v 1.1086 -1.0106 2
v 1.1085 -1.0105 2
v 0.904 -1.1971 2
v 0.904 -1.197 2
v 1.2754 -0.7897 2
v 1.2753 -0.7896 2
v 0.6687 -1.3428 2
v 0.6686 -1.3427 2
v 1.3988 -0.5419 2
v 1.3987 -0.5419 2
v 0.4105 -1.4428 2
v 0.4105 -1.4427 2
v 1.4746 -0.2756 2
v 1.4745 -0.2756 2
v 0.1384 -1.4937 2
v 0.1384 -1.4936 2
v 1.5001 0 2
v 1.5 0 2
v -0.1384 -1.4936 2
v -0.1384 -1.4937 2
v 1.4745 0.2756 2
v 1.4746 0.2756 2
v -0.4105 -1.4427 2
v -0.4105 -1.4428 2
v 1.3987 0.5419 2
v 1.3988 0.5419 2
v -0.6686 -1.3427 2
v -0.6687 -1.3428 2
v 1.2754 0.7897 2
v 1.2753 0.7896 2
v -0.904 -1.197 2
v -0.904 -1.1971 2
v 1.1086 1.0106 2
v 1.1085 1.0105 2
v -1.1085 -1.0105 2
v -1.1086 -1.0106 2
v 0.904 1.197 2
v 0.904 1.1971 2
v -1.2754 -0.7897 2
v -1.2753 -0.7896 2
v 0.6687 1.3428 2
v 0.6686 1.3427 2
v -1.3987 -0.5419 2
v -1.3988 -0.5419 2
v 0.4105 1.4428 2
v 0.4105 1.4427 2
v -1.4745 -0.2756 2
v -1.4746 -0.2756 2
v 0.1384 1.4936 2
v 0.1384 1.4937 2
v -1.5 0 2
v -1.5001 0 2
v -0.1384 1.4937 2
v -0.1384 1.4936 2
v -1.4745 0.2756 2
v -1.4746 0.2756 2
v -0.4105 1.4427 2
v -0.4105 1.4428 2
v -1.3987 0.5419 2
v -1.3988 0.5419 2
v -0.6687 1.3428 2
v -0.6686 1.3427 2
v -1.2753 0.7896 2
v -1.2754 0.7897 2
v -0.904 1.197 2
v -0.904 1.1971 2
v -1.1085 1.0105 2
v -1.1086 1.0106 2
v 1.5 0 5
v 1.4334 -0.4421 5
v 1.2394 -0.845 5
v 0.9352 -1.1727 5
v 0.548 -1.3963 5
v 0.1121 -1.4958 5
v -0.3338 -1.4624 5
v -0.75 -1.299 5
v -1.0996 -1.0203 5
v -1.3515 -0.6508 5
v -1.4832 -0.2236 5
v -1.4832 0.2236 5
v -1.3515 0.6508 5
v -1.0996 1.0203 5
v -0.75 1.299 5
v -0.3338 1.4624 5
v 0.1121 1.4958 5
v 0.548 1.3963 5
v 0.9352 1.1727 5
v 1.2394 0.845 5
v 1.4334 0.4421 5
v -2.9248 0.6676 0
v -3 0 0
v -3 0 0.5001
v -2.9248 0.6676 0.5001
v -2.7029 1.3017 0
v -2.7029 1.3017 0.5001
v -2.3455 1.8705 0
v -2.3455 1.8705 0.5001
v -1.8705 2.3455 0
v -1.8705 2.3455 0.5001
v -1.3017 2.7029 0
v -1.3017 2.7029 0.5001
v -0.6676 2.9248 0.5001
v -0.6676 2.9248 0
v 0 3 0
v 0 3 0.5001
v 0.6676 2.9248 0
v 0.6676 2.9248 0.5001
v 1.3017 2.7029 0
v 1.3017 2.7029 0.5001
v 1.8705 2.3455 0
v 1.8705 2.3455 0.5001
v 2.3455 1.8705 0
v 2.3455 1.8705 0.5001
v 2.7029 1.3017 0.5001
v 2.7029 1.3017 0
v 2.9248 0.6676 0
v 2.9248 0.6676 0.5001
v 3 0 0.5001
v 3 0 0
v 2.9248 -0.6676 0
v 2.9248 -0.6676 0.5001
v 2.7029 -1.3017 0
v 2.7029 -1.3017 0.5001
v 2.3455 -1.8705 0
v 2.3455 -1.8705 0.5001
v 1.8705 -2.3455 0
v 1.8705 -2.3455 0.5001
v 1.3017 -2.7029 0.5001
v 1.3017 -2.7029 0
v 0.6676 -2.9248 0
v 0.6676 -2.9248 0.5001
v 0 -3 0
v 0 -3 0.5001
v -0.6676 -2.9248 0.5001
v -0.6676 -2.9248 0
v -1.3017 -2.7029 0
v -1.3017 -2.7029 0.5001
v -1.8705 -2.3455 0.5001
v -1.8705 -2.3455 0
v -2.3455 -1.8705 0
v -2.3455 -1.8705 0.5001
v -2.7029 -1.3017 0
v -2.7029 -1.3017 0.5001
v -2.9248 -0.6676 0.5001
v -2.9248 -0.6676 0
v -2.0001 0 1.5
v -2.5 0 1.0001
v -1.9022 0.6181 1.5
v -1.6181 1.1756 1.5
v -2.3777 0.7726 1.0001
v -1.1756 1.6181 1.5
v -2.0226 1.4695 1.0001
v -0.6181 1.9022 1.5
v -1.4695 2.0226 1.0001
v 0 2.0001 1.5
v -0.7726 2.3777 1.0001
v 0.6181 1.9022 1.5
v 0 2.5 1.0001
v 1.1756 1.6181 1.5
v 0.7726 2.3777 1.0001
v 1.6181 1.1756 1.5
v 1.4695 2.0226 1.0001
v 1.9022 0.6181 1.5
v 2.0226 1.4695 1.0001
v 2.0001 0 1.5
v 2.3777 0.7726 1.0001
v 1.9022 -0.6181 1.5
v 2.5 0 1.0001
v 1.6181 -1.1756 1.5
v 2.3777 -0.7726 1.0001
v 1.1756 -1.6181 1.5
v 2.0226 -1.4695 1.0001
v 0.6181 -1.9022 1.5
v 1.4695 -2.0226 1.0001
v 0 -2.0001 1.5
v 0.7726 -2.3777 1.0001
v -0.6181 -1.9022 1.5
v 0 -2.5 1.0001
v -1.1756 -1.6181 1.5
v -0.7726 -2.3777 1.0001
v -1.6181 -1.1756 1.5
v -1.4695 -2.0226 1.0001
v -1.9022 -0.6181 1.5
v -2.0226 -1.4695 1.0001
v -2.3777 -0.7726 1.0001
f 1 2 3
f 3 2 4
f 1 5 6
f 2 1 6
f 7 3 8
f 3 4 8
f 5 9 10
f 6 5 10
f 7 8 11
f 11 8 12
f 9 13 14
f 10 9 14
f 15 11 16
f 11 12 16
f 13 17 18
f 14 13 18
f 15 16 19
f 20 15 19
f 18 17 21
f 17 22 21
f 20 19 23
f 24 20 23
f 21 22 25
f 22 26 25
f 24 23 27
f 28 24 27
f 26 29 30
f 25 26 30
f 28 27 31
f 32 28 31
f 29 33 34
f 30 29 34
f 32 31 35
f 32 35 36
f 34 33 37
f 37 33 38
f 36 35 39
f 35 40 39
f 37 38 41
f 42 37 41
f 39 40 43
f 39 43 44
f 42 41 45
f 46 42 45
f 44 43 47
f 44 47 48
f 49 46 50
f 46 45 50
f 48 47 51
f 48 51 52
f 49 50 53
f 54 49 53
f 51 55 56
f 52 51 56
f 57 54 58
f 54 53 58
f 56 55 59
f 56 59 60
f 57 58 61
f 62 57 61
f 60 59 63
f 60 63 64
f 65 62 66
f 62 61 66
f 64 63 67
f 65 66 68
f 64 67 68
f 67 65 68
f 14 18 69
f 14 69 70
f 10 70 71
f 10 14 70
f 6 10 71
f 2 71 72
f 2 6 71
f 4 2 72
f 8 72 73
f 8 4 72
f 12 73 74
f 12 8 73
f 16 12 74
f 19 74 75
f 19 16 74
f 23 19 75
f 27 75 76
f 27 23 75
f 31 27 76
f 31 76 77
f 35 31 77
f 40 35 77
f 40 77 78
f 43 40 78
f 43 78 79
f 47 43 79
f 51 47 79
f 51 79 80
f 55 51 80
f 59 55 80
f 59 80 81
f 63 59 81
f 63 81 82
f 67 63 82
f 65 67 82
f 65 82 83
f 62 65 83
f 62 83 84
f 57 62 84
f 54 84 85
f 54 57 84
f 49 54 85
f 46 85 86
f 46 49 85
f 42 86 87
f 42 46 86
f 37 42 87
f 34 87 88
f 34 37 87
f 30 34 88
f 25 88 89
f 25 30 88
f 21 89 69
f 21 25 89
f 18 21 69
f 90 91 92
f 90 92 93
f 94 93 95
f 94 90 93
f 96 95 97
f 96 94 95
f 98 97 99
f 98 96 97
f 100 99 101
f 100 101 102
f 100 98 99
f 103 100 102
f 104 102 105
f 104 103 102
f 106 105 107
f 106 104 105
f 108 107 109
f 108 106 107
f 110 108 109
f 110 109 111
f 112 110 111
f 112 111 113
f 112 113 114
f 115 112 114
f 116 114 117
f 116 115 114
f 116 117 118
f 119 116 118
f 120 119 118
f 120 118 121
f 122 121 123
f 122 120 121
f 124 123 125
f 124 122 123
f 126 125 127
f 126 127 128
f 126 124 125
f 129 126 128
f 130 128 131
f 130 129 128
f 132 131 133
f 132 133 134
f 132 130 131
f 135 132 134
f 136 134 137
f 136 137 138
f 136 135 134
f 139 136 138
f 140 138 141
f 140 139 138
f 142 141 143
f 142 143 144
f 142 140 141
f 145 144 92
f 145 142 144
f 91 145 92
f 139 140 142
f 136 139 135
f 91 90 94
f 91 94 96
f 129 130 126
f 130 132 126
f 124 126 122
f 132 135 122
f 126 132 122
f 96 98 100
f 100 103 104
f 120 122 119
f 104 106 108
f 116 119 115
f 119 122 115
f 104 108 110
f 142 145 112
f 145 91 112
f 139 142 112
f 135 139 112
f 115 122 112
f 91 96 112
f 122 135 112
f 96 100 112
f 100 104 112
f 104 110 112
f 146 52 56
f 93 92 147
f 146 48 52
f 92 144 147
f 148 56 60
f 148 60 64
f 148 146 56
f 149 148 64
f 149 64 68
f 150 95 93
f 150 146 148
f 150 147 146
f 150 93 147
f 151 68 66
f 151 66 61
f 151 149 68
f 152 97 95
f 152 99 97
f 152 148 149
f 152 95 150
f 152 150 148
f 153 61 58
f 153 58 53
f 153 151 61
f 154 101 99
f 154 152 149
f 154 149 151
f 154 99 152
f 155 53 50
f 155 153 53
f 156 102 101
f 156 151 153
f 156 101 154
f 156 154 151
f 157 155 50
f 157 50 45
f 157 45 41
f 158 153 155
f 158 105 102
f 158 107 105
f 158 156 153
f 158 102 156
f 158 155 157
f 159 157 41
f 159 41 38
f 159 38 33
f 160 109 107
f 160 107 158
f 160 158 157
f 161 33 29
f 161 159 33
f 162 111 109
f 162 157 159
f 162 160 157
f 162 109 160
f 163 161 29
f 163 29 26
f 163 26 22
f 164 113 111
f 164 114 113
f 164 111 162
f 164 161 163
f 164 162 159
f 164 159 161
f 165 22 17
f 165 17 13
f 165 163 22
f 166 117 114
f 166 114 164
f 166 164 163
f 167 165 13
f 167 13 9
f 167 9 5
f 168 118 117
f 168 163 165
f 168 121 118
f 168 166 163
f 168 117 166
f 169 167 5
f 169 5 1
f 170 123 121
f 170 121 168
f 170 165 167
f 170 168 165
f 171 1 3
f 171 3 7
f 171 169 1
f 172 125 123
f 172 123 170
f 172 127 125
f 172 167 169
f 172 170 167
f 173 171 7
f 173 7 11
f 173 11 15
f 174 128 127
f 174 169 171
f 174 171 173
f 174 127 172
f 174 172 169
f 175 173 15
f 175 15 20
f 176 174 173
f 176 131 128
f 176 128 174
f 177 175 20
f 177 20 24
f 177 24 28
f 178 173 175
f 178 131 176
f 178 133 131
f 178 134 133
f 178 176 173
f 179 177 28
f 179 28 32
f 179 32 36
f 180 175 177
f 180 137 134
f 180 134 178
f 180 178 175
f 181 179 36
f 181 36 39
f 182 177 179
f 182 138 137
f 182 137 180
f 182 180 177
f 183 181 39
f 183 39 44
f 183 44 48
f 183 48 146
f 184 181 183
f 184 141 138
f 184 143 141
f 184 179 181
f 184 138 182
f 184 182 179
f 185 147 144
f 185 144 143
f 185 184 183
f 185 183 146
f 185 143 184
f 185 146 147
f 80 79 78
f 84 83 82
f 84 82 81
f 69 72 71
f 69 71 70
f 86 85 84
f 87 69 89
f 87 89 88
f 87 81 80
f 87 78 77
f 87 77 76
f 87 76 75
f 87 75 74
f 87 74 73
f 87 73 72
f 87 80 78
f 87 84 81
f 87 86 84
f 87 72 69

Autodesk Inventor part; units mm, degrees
ref_plane "YZ Plane" through (0, 0, 0) normal (1, 0, 0) x (0, 1, 0)
ref_plane "XZ Plane" through (0, 0, 0) normal (0, 1, 0) x (-1, 0, 0)
ref_plane "XY Plane" through (0, 0, 0) normal (0, 0, 1) x (1, 0, 0)
sketch "スケッチ1" plane through (0, 0, 0) normal (0, 0, 1) x (1, 0, 0)
  circle A0 centre (0, 0) radius 1.5
  dimension "d0" = 3
extrude "押し出し1" add sketch "スケッチ1" along normal blind 5
sketch "スケッチ2" plane through (0, 0, 0) normal (0, 0, -1) x (-1, 0, 0)
  circle A0 centre (0, 0) radius 3
  dimension "d3" = 6
extrude "押し出し2" add sketch "スケッチ2" against normal blind 2
thread "ねじ1" size "M3x0.5" class "6g" standard "ANSI Metric M Profile" full length
chamfer "面取り1" distance 1.5 angle 45 1 edges at (3, 0, 2)
properties part number "ネジ皿m3,05" material "鋼、高強度、低合金"
